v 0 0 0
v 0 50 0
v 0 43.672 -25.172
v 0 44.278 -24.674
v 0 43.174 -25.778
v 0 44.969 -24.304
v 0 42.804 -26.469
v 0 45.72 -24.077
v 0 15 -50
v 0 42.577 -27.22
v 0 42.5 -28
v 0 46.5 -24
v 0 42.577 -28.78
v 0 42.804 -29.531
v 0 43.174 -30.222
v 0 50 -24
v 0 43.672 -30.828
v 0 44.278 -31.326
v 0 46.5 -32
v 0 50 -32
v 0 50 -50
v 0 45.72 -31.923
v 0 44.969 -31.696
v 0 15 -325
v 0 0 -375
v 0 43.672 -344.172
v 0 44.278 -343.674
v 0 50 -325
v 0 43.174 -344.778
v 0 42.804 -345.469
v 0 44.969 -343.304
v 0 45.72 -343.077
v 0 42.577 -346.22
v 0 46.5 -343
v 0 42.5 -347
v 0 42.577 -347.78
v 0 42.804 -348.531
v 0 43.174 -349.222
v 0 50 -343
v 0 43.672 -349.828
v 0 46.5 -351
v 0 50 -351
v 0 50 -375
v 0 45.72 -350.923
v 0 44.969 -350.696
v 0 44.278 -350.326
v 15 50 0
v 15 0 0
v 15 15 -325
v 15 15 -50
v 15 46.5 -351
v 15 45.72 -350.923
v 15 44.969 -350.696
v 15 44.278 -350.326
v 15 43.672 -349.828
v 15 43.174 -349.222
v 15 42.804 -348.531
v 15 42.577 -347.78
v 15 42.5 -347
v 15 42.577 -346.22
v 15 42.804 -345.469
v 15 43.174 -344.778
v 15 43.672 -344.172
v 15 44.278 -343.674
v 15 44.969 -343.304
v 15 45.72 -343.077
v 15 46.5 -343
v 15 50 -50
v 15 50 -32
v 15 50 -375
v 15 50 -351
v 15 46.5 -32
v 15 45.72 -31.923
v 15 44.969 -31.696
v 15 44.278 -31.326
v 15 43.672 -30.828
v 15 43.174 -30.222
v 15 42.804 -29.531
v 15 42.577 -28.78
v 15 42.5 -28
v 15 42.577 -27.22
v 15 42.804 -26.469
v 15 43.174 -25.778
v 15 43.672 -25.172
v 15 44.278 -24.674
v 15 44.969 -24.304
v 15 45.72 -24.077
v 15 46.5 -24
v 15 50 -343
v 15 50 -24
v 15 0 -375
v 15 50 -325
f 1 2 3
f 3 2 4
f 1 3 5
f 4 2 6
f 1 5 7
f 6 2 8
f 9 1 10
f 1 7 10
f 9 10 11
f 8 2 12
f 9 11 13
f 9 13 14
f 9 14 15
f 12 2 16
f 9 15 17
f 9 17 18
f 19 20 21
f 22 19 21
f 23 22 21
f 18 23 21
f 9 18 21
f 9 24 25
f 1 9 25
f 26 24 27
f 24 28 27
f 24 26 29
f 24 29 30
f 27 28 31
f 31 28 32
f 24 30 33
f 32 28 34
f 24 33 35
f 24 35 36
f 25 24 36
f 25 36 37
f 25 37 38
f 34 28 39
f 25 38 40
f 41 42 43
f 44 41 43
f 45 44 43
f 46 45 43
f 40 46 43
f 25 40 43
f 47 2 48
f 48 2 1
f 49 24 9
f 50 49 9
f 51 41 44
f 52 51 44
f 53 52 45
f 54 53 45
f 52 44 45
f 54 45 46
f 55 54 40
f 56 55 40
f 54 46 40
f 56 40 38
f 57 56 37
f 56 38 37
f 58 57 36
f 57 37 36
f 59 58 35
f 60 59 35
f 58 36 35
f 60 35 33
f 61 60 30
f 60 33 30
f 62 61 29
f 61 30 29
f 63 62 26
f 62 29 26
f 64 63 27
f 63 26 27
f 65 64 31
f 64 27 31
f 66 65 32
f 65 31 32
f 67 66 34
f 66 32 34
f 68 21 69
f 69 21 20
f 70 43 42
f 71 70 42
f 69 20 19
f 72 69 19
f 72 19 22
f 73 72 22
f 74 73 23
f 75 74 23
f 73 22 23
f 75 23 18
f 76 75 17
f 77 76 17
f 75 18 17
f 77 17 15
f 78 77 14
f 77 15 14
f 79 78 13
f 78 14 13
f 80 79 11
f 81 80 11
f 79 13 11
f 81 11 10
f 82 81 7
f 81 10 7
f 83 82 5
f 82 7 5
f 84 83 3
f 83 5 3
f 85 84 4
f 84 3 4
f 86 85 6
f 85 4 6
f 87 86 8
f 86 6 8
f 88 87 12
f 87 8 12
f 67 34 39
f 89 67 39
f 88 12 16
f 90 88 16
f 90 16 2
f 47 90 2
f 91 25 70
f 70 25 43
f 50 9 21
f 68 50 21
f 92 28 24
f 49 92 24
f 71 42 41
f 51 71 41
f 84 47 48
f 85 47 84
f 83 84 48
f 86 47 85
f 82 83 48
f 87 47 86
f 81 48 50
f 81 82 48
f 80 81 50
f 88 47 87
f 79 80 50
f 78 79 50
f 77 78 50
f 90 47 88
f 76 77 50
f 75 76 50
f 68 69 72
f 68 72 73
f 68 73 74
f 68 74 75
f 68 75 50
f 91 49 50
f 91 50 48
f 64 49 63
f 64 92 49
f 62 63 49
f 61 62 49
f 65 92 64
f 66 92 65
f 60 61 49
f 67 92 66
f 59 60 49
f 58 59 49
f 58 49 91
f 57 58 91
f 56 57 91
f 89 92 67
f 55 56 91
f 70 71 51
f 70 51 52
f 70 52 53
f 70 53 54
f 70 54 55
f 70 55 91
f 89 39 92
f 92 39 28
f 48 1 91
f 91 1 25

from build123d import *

# Parameters (mm, degrees)
SALIENTE_EXTRUIR3_DEPTH = 15


with BuildPart() as part:
    # Croquis2 → Saliente-Extruir3 (new body)
    with BuildSketch(Plane(origin=(0, 0, 0), x_dir=(0, 0, -1), z_dir=(1, 0, 0))):
        with BuildLine():
            Line((0, 0), (375, 0))
            Line((375, 0), (375, 50))
            Line((375, 50), (351, 50))
            Line((351, 50), (351, 46.5))
            ThreePointArc((351, 46.5), (347, 42.5), (343, 46.5))
            Line((343, 46.5), (343, 50))
            Line((343, 50), (325, 50))
            Line((325, 50), (325, 15))
            Line((325, 15), (50, 15))
            Line((50, 15), (50, 50))
            Line((50, 50), (32, 50))
            Line((32, 50), (32, 46.5))
            ThreePointArc((32, 46.5), (28, 42.5), (24, 46.5))
            Line((24, 46.5), (24, 50))
            Line((24, 50), (0, 50))
            Line((0, 50), (0, 0))
        make_face()
    extrude(amount=SALIENTE_EXTRUIR3_DEPTH)


solid = part.part
